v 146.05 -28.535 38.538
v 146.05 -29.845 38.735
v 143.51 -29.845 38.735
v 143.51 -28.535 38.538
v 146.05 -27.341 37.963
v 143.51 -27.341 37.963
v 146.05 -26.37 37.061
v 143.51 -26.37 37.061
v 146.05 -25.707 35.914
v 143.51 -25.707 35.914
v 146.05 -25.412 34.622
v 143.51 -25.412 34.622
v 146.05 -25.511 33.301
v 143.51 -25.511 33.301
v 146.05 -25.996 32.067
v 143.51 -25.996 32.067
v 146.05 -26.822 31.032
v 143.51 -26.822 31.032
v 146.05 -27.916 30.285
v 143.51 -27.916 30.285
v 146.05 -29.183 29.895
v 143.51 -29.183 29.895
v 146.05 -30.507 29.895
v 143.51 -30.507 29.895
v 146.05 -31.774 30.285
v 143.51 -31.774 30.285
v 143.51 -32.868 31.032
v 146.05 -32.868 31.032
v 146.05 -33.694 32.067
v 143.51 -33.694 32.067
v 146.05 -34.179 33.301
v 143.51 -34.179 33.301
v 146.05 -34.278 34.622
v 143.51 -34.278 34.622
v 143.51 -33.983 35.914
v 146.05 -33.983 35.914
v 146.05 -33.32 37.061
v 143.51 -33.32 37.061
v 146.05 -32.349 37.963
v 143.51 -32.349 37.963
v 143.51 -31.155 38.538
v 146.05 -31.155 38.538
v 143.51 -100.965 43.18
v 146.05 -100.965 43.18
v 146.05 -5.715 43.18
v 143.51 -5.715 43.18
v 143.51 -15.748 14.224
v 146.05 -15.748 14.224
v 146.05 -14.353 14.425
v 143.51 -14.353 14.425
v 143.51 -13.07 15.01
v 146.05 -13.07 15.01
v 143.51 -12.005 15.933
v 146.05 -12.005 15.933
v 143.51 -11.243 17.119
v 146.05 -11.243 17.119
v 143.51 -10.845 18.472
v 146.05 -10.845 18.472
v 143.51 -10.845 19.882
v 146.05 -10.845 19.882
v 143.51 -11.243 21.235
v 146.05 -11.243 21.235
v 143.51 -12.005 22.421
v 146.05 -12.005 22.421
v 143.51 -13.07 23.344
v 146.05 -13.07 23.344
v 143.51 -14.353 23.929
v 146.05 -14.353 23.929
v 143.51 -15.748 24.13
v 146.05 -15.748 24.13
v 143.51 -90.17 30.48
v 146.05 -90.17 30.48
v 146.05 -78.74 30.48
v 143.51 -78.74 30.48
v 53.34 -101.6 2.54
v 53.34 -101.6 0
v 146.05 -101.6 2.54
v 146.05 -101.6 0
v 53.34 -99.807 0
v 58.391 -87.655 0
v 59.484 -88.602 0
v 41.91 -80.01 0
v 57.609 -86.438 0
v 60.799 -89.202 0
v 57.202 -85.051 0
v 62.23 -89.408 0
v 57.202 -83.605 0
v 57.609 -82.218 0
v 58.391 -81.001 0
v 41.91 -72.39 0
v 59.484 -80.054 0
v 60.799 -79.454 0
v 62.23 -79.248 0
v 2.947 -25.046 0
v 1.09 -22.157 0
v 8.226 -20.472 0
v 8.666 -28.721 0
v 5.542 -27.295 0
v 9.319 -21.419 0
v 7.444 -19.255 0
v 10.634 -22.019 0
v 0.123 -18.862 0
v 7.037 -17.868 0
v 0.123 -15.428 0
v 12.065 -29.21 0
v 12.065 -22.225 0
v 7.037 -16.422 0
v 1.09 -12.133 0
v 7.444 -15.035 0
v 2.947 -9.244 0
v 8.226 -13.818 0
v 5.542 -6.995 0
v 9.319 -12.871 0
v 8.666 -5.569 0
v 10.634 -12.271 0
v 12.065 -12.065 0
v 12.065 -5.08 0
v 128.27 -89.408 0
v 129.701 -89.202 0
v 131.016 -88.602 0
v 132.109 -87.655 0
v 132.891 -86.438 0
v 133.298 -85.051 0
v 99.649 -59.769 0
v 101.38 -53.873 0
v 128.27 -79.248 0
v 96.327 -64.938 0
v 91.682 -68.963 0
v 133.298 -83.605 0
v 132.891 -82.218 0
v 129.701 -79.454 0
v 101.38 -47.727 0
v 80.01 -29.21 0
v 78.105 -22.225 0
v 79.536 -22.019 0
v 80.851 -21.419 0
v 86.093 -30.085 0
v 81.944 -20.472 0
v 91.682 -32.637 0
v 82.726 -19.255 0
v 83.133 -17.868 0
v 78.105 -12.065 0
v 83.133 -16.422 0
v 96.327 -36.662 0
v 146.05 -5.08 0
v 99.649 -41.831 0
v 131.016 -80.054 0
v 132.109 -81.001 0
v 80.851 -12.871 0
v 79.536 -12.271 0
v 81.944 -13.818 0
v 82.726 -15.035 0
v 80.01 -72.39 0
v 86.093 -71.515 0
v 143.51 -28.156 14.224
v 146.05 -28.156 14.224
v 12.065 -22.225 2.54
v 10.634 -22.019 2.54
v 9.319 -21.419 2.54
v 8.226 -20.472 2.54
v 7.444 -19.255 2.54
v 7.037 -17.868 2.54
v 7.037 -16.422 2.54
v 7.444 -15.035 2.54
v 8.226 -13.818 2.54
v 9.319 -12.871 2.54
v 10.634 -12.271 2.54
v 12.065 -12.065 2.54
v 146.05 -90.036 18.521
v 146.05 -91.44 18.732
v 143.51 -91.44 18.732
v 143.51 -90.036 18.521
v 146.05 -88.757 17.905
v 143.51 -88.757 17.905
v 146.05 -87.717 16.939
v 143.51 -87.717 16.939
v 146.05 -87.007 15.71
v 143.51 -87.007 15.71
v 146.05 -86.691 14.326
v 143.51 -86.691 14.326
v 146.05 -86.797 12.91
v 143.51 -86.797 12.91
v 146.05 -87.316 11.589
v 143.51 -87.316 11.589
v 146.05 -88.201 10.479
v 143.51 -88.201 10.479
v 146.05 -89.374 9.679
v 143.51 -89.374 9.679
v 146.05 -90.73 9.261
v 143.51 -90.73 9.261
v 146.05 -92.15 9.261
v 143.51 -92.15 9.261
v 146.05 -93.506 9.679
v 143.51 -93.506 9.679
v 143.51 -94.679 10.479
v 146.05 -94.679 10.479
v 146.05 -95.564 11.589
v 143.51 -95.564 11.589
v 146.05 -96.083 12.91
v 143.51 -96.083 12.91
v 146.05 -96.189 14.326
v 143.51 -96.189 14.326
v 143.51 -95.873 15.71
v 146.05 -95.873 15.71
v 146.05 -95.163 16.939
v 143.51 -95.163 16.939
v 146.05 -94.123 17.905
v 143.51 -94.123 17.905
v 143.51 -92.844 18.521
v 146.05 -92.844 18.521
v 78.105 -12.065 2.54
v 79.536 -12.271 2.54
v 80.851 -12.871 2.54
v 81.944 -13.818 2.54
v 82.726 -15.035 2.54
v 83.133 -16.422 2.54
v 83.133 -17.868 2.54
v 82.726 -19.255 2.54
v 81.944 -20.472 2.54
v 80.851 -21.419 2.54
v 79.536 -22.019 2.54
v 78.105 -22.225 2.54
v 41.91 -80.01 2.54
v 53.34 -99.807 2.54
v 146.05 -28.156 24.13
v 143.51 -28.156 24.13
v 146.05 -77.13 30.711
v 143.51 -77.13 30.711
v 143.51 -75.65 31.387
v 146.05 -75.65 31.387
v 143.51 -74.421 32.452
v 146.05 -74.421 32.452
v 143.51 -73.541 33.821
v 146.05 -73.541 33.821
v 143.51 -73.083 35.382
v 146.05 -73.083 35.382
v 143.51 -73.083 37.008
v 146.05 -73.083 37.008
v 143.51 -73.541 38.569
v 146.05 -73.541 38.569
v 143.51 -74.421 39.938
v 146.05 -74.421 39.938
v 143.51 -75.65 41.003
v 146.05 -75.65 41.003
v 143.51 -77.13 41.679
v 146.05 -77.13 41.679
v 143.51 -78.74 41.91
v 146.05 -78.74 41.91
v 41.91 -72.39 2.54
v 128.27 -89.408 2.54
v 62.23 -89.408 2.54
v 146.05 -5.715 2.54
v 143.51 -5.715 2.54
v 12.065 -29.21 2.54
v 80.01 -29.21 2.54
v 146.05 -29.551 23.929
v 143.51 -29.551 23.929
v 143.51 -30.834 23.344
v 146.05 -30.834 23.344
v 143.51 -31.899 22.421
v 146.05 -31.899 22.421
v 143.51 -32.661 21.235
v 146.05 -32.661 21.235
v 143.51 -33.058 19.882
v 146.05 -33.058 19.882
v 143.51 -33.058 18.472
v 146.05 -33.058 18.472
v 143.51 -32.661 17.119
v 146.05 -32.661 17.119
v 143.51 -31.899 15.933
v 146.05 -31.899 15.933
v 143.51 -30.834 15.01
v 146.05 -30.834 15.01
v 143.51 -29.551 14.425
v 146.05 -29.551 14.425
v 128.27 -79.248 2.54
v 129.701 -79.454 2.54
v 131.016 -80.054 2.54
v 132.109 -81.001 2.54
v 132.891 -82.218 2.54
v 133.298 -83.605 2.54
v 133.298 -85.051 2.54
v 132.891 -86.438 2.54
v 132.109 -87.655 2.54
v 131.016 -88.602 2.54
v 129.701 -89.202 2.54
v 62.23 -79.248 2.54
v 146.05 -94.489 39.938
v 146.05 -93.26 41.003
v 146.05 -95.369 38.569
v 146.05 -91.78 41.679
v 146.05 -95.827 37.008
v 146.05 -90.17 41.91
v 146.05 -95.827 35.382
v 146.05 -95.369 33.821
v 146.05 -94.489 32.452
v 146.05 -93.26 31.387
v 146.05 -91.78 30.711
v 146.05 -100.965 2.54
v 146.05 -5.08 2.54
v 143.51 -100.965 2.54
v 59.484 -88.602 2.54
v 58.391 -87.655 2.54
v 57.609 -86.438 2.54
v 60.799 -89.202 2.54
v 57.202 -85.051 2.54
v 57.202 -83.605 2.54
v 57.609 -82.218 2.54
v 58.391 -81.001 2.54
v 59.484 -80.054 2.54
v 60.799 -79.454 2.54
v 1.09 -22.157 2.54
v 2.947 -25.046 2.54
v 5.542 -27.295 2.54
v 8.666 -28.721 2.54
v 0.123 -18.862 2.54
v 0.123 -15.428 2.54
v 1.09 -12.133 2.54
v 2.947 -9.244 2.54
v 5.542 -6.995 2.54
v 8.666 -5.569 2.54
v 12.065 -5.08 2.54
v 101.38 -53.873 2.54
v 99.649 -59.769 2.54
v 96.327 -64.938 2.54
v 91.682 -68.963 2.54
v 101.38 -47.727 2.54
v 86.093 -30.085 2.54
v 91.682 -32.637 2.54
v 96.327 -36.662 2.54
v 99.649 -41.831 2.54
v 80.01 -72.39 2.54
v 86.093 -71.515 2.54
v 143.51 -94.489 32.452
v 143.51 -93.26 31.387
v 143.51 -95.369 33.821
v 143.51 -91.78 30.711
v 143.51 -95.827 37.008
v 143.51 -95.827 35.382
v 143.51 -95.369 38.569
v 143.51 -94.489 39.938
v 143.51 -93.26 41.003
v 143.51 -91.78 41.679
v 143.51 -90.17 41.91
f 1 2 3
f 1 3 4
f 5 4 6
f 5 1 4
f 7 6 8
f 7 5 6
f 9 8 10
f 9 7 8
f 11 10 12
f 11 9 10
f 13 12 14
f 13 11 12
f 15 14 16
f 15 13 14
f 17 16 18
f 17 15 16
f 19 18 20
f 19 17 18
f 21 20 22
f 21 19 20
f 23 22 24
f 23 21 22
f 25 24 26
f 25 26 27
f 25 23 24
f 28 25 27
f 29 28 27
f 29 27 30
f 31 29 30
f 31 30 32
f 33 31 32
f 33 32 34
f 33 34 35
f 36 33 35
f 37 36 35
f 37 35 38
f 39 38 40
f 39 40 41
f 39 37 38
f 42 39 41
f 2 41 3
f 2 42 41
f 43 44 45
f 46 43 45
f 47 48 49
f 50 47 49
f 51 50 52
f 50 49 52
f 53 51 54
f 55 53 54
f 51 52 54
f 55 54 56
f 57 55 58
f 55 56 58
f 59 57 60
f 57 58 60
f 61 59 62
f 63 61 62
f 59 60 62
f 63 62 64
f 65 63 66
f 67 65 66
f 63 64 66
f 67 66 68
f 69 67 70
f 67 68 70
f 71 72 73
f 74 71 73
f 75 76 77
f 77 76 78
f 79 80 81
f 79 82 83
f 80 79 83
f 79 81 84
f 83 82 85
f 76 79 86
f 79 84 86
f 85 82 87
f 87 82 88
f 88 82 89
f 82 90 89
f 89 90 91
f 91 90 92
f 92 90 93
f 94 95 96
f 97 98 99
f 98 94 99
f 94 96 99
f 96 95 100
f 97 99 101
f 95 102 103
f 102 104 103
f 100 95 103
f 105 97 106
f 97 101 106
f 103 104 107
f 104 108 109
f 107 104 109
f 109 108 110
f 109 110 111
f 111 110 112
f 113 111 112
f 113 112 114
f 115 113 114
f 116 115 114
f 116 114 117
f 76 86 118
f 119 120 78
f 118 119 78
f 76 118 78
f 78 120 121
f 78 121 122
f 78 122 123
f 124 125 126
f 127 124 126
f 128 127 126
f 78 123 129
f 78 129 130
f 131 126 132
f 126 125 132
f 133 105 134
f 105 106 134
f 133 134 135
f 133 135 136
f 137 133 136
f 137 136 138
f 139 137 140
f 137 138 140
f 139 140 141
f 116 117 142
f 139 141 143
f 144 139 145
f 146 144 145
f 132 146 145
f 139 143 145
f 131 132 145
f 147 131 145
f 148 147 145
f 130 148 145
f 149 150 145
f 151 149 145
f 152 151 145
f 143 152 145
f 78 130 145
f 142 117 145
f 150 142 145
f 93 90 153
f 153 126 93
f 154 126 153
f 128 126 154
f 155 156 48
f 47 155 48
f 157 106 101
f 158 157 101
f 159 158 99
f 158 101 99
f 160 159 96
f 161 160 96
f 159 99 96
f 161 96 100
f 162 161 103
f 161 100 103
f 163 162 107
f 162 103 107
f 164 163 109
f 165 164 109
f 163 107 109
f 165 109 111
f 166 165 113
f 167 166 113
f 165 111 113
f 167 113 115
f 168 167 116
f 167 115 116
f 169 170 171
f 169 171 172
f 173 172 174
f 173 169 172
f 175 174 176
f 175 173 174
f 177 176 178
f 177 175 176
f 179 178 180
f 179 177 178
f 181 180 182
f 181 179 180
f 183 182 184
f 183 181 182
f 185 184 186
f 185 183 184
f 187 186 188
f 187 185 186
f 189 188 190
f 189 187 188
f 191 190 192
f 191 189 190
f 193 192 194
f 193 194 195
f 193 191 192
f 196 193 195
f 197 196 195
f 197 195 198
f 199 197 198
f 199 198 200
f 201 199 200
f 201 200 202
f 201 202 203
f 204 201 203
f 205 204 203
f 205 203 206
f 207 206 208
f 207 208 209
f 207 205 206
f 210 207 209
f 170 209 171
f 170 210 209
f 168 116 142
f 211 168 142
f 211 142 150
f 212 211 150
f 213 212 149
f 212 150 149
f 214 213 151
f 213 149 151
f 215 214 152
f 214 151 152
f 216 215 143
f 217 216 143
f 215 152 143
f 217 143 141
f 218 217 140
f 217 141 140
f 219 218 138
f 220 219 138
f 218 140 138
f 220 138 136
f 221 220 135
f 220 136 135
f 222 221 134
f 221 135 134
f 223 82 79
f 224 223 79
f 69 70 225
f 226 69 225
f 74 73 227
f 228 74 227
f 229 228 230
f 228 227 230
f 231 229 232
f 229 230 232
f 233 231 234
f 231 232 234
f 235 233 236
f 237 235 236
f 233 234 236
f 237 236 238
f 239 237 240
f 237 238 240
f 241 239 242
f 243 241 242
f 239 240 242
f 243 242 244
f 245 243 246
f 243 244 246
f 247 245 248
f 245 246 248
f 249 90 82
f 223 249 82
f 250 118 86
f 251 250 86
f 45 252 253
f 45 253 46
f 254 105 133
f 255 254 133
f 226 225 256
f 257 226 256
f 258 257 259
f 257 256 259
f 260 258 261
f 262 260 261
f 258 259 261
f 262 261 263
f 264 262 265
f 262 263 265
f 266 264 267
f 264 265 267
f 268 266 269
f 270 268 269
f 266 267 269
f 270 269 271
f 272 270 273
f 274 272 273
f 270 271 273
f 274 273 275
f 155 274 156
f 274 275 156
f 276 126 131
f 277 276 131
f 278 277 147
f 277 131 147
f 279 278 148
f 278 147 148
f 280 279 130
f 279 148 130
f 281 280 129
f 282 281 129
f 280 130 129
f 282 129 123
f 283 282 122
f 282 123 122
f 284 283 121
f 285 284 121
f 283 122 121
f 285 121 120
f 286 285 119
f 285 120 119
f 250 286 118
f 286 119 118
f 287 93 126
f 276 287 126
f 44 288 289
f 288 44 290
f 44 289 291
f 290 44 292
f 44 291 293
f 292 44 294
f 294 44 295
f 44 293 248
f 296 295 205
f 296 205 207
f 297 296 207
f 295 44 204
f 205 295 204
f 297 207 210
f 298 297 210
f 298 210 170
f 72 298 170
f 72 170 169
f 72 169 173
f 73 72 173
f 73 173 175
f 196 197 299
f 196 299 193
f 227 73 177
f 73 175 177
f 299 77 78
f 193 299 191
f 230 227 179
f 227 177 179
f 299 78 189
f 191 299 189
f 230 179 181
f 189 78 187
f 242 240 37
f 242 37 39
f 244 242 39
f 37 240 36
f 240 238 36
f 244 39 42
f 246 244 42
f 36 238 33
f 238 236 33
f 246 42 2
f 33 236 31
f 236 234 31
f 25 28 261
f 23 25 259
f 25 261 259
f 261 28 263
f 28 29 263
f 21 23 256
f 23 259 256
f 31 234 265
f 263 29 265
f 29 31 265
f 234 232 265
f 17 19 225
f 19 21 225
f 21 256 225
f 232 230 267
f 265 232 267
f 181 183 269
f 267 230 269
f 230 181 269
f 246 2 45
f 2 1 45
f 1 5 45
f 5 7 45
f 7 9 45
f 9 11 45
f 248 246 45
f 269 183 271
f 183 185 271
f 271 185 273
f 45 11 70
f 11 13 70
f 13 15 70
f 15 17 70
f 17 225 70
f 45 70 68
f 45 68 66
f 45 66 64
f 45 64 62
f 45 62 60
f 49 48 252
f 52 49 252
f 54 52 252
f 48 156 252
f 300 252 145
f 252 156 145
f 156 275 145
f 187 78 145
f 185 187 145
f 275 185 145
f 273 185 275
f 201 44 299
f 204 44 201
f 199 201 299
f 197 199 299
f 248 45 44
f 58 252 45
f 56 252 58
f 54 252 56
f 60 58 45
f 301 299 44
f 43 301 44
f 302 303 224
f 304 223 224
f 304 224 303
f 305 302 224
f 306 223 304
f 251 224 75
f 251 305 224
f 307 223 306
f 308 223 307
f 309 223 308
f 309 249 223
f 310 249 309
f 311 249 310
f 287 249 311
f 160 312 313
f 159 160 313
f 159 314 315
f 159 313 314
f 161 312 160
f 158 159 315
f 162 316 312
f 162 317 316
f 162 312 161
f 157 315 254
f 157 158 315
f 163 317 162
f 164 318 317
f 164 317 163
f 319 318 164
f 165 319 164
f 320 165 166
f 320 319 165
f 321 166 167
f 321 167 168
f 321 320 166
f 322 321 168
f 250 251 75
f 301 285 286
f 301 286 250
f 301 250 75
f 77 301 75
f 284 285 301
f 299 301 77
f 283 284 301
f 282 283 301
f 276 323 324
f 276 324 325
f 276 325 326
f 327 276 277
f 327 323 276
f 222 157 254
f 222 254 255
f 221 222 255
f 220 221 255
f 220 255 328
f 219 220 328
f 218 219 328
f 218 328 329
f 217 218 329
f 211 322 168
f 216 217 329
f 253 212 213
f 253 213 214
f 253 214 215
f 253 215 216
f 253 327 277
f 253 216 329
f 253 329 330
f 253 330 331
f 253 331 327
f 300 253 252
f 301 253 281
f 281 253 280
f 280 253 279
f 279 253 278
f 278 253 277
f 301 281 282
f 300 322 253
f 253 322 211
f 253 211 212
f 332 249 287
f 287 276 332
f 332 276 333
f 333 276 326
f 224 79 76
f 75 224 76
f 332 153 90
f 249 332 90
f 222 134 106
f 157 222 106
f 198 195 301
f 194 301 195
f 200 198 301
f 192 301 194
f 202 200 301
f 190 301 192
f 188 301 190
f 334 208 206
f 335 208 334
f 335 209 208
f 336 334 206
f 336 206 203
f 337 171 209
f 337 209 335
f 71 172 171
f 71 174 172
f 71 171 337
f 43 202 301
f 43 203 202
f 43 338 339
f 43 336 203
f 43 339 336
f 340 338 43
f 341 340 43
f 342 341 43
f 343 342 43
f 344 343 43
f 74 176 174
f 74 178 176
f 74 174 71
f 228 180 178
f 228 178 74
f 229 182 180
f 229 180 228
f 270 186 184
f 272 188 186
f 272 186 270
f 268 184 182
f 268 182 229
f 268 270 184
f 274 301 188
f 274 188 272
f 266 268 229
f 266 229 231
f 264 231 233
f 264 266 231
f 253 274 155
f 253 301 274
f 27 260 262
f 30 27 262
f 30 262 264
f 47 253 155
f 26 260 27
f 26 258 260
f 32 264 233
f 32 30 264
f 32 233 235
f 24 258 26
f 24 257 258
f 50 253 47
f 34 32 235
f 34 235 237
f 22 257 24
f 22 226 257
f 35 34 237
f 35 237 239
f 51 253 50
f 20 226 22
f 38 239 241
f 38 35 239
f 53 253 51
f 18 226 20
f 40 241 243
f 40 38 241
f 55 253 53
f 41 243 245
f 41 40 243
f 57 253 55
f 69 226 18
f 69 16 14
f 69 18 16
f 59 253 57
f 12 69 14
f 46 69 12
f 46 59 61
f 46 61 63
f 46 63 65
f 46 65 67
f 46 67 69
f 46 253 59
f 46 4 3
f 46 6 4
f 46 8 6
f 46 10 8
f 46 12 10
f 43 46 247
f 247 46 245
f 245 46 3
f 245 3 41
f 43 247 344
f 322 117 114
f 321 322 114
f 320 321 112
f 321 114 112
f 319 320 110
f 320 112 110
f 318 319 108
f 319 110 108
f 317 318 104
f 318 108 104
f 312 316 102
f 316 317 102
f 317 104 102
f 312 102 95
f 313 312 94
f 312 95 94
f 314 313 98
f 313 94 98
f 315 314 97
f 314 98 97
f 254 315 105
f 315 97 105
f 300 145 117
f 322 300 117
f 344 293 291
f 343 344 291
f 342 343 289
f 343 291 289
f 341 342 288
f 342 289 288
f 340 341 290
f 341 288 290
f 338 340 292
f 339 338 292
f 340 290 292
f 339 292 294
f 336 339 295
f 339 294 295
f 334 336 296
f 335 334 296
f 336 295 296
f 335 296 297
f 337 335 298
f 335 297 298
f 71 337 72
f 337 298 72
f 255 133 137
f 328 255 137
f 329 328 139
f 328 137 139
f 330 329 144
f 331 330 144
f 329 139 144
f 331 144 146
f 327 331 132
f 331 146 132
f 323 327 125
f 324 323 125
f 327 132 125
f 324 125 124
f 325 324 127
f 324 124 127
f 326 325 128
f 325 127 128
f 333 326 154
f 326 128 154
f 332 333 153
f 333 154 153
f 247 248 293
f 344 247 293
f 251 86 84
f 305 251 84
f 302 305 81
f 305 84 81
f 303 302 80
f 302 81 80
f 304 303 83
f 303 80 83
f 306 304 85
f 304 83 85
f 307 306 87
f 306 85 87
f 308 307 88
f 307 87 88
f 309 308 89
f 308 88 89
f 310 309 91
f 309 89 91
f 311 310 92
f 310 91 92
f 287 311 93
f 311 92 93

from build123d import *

# Parameters (mm, degrees)
SKETCH1_W           = 146.05
SKETCH1_H           = 101.6
BOSS_EXTRUDE1_DEPTH = 2.54
CUT_EXTRUDE1_DEPTH  = 178.931487095
SKETCH4_W           = 40.64
SKETCH4_H           = 95.25
SKETCH4_R           = 4.445
SKETCH4_R_2         = 4.7625
BOSS_EXTRUDE2_DEPTH = 2.54


with BuildPart() as part:
    # Sketch1 → Boss-Extrude1 (new body)
    with BuildSketch(Plane.XY):
        with Locations((73.025, -50.8)):
            Rectangle(SKETCH1_W, SKETCH1_H)
    extrude(amount=BOSS_EXTRUDE1_DEPTH)

    # Sketch2 → Cut-Extrude1 (cut, through all)
    with BuildSketch(Plane.XY):
        with BuildLine():
            Line((80.01, -72.39), (41.91, -72.39))
            Line((41.91, -72.39), (41.91, -80.01))
            Line((41.91, -80.01), (53.34, -99.807340731))
            Line((53.34, -99.807340731), (53.34, -101.6))
            Line((53.34, -101.6), (0, -101.6))
            Line((0, -101.6), (0, -29.21))
            Line((0, -29.21), (-13.136118413, -29.21))
            Line((-13.136118413, -29.21), (-13.136118413, 0))
            Line((-13.136118413, 0), (146.05, 0))
            Line((146.05, 0), (146.05, -5.08))
            Line((146.05, -5.08), (12.065, -5.08))
            ThreePointArc((12.065, -5.08), (0, -17.145), (12.065, -29.21))
            Line((12.065, -29.21), (80.01, -29.21))
            ThreePointArc((80.01, -29.21), (101.6, -50.8), (80.01, -72.39))
        make_face()
        with BuildLine():
            Line((12.065, -12.065), (78.105, -12.065))
            ThreePointArc((78.105, -12.065), (83.185, -17.145), (78.105, -22.225))
            Line((78.105, -22.225), (12.065, -22.225))
            ThreePointArc((12.065, -22.225), (6.985, -17.145), (12.065, -12.065))
        make_face()
        with BuildLine():
            Line((62.23, -79.248), (128.27, -79.248))
            ThreePointArc((128.27, -79.248), (133.35, -84.328), (128.27, -89.408))
            Line((128.27, -89.408), (62.23, -89.408))
            ThreePointArc((62.23, -89.408), (57.15, -84.328), (62.23, -79.248))
        make_face()
    extrude(amount=CUT_EXTRUDE1_DEPTH, mode=Mode.SUBTRACT)

    # Sketch4 → Boss-Extrude2 (add)
    with BuildSketch(Plane.ZY.offset(-146.05)):
        with Locations((22.86, -53.34)):
            Rectangle(SKETCH4_W, SKETCH4_H)
        with Locations((34.29, -29.845)):
            Circle(SKETCH4_R, mode=Mode.SUBTRACT)
        with Locations((13.97, -91.44)):
            Circle(SKETCH4_R_2, mode=Mode.SUBTRACT)
        with BuildLine():
            Line((24.13, -15.748), (24.13, -28.1559))
            ThreePointArc((24.13, -28.1559), (19.177, -33.1089), (14.224, -28.1559))
            Line((14.224, -28.1559), (14.224, -15.748))
            ThreePointArc((14.224, -15.748), (19.177, -10.795), (24.13, -15.748))
        make_face(mode=Mode.SUBTRACT)
        with BuildLine():
            Line((41.91, -78.74), (41.91, -90.17))
            ThreePointArc((41.91, -90.17), (36.195, -95.885), (30.48, -90.17))
            Line((30.48, -90.17), (30.48, -78.74))
            ThreePointArc((30.48, -78.74), (36.195, -73.025), (41.91, -78.74))
        make_face(mode=Mode.SUBTRACT)
    extrude(amount=BOSS_EXTRUDE2_DEPTH)


solid = part.part
